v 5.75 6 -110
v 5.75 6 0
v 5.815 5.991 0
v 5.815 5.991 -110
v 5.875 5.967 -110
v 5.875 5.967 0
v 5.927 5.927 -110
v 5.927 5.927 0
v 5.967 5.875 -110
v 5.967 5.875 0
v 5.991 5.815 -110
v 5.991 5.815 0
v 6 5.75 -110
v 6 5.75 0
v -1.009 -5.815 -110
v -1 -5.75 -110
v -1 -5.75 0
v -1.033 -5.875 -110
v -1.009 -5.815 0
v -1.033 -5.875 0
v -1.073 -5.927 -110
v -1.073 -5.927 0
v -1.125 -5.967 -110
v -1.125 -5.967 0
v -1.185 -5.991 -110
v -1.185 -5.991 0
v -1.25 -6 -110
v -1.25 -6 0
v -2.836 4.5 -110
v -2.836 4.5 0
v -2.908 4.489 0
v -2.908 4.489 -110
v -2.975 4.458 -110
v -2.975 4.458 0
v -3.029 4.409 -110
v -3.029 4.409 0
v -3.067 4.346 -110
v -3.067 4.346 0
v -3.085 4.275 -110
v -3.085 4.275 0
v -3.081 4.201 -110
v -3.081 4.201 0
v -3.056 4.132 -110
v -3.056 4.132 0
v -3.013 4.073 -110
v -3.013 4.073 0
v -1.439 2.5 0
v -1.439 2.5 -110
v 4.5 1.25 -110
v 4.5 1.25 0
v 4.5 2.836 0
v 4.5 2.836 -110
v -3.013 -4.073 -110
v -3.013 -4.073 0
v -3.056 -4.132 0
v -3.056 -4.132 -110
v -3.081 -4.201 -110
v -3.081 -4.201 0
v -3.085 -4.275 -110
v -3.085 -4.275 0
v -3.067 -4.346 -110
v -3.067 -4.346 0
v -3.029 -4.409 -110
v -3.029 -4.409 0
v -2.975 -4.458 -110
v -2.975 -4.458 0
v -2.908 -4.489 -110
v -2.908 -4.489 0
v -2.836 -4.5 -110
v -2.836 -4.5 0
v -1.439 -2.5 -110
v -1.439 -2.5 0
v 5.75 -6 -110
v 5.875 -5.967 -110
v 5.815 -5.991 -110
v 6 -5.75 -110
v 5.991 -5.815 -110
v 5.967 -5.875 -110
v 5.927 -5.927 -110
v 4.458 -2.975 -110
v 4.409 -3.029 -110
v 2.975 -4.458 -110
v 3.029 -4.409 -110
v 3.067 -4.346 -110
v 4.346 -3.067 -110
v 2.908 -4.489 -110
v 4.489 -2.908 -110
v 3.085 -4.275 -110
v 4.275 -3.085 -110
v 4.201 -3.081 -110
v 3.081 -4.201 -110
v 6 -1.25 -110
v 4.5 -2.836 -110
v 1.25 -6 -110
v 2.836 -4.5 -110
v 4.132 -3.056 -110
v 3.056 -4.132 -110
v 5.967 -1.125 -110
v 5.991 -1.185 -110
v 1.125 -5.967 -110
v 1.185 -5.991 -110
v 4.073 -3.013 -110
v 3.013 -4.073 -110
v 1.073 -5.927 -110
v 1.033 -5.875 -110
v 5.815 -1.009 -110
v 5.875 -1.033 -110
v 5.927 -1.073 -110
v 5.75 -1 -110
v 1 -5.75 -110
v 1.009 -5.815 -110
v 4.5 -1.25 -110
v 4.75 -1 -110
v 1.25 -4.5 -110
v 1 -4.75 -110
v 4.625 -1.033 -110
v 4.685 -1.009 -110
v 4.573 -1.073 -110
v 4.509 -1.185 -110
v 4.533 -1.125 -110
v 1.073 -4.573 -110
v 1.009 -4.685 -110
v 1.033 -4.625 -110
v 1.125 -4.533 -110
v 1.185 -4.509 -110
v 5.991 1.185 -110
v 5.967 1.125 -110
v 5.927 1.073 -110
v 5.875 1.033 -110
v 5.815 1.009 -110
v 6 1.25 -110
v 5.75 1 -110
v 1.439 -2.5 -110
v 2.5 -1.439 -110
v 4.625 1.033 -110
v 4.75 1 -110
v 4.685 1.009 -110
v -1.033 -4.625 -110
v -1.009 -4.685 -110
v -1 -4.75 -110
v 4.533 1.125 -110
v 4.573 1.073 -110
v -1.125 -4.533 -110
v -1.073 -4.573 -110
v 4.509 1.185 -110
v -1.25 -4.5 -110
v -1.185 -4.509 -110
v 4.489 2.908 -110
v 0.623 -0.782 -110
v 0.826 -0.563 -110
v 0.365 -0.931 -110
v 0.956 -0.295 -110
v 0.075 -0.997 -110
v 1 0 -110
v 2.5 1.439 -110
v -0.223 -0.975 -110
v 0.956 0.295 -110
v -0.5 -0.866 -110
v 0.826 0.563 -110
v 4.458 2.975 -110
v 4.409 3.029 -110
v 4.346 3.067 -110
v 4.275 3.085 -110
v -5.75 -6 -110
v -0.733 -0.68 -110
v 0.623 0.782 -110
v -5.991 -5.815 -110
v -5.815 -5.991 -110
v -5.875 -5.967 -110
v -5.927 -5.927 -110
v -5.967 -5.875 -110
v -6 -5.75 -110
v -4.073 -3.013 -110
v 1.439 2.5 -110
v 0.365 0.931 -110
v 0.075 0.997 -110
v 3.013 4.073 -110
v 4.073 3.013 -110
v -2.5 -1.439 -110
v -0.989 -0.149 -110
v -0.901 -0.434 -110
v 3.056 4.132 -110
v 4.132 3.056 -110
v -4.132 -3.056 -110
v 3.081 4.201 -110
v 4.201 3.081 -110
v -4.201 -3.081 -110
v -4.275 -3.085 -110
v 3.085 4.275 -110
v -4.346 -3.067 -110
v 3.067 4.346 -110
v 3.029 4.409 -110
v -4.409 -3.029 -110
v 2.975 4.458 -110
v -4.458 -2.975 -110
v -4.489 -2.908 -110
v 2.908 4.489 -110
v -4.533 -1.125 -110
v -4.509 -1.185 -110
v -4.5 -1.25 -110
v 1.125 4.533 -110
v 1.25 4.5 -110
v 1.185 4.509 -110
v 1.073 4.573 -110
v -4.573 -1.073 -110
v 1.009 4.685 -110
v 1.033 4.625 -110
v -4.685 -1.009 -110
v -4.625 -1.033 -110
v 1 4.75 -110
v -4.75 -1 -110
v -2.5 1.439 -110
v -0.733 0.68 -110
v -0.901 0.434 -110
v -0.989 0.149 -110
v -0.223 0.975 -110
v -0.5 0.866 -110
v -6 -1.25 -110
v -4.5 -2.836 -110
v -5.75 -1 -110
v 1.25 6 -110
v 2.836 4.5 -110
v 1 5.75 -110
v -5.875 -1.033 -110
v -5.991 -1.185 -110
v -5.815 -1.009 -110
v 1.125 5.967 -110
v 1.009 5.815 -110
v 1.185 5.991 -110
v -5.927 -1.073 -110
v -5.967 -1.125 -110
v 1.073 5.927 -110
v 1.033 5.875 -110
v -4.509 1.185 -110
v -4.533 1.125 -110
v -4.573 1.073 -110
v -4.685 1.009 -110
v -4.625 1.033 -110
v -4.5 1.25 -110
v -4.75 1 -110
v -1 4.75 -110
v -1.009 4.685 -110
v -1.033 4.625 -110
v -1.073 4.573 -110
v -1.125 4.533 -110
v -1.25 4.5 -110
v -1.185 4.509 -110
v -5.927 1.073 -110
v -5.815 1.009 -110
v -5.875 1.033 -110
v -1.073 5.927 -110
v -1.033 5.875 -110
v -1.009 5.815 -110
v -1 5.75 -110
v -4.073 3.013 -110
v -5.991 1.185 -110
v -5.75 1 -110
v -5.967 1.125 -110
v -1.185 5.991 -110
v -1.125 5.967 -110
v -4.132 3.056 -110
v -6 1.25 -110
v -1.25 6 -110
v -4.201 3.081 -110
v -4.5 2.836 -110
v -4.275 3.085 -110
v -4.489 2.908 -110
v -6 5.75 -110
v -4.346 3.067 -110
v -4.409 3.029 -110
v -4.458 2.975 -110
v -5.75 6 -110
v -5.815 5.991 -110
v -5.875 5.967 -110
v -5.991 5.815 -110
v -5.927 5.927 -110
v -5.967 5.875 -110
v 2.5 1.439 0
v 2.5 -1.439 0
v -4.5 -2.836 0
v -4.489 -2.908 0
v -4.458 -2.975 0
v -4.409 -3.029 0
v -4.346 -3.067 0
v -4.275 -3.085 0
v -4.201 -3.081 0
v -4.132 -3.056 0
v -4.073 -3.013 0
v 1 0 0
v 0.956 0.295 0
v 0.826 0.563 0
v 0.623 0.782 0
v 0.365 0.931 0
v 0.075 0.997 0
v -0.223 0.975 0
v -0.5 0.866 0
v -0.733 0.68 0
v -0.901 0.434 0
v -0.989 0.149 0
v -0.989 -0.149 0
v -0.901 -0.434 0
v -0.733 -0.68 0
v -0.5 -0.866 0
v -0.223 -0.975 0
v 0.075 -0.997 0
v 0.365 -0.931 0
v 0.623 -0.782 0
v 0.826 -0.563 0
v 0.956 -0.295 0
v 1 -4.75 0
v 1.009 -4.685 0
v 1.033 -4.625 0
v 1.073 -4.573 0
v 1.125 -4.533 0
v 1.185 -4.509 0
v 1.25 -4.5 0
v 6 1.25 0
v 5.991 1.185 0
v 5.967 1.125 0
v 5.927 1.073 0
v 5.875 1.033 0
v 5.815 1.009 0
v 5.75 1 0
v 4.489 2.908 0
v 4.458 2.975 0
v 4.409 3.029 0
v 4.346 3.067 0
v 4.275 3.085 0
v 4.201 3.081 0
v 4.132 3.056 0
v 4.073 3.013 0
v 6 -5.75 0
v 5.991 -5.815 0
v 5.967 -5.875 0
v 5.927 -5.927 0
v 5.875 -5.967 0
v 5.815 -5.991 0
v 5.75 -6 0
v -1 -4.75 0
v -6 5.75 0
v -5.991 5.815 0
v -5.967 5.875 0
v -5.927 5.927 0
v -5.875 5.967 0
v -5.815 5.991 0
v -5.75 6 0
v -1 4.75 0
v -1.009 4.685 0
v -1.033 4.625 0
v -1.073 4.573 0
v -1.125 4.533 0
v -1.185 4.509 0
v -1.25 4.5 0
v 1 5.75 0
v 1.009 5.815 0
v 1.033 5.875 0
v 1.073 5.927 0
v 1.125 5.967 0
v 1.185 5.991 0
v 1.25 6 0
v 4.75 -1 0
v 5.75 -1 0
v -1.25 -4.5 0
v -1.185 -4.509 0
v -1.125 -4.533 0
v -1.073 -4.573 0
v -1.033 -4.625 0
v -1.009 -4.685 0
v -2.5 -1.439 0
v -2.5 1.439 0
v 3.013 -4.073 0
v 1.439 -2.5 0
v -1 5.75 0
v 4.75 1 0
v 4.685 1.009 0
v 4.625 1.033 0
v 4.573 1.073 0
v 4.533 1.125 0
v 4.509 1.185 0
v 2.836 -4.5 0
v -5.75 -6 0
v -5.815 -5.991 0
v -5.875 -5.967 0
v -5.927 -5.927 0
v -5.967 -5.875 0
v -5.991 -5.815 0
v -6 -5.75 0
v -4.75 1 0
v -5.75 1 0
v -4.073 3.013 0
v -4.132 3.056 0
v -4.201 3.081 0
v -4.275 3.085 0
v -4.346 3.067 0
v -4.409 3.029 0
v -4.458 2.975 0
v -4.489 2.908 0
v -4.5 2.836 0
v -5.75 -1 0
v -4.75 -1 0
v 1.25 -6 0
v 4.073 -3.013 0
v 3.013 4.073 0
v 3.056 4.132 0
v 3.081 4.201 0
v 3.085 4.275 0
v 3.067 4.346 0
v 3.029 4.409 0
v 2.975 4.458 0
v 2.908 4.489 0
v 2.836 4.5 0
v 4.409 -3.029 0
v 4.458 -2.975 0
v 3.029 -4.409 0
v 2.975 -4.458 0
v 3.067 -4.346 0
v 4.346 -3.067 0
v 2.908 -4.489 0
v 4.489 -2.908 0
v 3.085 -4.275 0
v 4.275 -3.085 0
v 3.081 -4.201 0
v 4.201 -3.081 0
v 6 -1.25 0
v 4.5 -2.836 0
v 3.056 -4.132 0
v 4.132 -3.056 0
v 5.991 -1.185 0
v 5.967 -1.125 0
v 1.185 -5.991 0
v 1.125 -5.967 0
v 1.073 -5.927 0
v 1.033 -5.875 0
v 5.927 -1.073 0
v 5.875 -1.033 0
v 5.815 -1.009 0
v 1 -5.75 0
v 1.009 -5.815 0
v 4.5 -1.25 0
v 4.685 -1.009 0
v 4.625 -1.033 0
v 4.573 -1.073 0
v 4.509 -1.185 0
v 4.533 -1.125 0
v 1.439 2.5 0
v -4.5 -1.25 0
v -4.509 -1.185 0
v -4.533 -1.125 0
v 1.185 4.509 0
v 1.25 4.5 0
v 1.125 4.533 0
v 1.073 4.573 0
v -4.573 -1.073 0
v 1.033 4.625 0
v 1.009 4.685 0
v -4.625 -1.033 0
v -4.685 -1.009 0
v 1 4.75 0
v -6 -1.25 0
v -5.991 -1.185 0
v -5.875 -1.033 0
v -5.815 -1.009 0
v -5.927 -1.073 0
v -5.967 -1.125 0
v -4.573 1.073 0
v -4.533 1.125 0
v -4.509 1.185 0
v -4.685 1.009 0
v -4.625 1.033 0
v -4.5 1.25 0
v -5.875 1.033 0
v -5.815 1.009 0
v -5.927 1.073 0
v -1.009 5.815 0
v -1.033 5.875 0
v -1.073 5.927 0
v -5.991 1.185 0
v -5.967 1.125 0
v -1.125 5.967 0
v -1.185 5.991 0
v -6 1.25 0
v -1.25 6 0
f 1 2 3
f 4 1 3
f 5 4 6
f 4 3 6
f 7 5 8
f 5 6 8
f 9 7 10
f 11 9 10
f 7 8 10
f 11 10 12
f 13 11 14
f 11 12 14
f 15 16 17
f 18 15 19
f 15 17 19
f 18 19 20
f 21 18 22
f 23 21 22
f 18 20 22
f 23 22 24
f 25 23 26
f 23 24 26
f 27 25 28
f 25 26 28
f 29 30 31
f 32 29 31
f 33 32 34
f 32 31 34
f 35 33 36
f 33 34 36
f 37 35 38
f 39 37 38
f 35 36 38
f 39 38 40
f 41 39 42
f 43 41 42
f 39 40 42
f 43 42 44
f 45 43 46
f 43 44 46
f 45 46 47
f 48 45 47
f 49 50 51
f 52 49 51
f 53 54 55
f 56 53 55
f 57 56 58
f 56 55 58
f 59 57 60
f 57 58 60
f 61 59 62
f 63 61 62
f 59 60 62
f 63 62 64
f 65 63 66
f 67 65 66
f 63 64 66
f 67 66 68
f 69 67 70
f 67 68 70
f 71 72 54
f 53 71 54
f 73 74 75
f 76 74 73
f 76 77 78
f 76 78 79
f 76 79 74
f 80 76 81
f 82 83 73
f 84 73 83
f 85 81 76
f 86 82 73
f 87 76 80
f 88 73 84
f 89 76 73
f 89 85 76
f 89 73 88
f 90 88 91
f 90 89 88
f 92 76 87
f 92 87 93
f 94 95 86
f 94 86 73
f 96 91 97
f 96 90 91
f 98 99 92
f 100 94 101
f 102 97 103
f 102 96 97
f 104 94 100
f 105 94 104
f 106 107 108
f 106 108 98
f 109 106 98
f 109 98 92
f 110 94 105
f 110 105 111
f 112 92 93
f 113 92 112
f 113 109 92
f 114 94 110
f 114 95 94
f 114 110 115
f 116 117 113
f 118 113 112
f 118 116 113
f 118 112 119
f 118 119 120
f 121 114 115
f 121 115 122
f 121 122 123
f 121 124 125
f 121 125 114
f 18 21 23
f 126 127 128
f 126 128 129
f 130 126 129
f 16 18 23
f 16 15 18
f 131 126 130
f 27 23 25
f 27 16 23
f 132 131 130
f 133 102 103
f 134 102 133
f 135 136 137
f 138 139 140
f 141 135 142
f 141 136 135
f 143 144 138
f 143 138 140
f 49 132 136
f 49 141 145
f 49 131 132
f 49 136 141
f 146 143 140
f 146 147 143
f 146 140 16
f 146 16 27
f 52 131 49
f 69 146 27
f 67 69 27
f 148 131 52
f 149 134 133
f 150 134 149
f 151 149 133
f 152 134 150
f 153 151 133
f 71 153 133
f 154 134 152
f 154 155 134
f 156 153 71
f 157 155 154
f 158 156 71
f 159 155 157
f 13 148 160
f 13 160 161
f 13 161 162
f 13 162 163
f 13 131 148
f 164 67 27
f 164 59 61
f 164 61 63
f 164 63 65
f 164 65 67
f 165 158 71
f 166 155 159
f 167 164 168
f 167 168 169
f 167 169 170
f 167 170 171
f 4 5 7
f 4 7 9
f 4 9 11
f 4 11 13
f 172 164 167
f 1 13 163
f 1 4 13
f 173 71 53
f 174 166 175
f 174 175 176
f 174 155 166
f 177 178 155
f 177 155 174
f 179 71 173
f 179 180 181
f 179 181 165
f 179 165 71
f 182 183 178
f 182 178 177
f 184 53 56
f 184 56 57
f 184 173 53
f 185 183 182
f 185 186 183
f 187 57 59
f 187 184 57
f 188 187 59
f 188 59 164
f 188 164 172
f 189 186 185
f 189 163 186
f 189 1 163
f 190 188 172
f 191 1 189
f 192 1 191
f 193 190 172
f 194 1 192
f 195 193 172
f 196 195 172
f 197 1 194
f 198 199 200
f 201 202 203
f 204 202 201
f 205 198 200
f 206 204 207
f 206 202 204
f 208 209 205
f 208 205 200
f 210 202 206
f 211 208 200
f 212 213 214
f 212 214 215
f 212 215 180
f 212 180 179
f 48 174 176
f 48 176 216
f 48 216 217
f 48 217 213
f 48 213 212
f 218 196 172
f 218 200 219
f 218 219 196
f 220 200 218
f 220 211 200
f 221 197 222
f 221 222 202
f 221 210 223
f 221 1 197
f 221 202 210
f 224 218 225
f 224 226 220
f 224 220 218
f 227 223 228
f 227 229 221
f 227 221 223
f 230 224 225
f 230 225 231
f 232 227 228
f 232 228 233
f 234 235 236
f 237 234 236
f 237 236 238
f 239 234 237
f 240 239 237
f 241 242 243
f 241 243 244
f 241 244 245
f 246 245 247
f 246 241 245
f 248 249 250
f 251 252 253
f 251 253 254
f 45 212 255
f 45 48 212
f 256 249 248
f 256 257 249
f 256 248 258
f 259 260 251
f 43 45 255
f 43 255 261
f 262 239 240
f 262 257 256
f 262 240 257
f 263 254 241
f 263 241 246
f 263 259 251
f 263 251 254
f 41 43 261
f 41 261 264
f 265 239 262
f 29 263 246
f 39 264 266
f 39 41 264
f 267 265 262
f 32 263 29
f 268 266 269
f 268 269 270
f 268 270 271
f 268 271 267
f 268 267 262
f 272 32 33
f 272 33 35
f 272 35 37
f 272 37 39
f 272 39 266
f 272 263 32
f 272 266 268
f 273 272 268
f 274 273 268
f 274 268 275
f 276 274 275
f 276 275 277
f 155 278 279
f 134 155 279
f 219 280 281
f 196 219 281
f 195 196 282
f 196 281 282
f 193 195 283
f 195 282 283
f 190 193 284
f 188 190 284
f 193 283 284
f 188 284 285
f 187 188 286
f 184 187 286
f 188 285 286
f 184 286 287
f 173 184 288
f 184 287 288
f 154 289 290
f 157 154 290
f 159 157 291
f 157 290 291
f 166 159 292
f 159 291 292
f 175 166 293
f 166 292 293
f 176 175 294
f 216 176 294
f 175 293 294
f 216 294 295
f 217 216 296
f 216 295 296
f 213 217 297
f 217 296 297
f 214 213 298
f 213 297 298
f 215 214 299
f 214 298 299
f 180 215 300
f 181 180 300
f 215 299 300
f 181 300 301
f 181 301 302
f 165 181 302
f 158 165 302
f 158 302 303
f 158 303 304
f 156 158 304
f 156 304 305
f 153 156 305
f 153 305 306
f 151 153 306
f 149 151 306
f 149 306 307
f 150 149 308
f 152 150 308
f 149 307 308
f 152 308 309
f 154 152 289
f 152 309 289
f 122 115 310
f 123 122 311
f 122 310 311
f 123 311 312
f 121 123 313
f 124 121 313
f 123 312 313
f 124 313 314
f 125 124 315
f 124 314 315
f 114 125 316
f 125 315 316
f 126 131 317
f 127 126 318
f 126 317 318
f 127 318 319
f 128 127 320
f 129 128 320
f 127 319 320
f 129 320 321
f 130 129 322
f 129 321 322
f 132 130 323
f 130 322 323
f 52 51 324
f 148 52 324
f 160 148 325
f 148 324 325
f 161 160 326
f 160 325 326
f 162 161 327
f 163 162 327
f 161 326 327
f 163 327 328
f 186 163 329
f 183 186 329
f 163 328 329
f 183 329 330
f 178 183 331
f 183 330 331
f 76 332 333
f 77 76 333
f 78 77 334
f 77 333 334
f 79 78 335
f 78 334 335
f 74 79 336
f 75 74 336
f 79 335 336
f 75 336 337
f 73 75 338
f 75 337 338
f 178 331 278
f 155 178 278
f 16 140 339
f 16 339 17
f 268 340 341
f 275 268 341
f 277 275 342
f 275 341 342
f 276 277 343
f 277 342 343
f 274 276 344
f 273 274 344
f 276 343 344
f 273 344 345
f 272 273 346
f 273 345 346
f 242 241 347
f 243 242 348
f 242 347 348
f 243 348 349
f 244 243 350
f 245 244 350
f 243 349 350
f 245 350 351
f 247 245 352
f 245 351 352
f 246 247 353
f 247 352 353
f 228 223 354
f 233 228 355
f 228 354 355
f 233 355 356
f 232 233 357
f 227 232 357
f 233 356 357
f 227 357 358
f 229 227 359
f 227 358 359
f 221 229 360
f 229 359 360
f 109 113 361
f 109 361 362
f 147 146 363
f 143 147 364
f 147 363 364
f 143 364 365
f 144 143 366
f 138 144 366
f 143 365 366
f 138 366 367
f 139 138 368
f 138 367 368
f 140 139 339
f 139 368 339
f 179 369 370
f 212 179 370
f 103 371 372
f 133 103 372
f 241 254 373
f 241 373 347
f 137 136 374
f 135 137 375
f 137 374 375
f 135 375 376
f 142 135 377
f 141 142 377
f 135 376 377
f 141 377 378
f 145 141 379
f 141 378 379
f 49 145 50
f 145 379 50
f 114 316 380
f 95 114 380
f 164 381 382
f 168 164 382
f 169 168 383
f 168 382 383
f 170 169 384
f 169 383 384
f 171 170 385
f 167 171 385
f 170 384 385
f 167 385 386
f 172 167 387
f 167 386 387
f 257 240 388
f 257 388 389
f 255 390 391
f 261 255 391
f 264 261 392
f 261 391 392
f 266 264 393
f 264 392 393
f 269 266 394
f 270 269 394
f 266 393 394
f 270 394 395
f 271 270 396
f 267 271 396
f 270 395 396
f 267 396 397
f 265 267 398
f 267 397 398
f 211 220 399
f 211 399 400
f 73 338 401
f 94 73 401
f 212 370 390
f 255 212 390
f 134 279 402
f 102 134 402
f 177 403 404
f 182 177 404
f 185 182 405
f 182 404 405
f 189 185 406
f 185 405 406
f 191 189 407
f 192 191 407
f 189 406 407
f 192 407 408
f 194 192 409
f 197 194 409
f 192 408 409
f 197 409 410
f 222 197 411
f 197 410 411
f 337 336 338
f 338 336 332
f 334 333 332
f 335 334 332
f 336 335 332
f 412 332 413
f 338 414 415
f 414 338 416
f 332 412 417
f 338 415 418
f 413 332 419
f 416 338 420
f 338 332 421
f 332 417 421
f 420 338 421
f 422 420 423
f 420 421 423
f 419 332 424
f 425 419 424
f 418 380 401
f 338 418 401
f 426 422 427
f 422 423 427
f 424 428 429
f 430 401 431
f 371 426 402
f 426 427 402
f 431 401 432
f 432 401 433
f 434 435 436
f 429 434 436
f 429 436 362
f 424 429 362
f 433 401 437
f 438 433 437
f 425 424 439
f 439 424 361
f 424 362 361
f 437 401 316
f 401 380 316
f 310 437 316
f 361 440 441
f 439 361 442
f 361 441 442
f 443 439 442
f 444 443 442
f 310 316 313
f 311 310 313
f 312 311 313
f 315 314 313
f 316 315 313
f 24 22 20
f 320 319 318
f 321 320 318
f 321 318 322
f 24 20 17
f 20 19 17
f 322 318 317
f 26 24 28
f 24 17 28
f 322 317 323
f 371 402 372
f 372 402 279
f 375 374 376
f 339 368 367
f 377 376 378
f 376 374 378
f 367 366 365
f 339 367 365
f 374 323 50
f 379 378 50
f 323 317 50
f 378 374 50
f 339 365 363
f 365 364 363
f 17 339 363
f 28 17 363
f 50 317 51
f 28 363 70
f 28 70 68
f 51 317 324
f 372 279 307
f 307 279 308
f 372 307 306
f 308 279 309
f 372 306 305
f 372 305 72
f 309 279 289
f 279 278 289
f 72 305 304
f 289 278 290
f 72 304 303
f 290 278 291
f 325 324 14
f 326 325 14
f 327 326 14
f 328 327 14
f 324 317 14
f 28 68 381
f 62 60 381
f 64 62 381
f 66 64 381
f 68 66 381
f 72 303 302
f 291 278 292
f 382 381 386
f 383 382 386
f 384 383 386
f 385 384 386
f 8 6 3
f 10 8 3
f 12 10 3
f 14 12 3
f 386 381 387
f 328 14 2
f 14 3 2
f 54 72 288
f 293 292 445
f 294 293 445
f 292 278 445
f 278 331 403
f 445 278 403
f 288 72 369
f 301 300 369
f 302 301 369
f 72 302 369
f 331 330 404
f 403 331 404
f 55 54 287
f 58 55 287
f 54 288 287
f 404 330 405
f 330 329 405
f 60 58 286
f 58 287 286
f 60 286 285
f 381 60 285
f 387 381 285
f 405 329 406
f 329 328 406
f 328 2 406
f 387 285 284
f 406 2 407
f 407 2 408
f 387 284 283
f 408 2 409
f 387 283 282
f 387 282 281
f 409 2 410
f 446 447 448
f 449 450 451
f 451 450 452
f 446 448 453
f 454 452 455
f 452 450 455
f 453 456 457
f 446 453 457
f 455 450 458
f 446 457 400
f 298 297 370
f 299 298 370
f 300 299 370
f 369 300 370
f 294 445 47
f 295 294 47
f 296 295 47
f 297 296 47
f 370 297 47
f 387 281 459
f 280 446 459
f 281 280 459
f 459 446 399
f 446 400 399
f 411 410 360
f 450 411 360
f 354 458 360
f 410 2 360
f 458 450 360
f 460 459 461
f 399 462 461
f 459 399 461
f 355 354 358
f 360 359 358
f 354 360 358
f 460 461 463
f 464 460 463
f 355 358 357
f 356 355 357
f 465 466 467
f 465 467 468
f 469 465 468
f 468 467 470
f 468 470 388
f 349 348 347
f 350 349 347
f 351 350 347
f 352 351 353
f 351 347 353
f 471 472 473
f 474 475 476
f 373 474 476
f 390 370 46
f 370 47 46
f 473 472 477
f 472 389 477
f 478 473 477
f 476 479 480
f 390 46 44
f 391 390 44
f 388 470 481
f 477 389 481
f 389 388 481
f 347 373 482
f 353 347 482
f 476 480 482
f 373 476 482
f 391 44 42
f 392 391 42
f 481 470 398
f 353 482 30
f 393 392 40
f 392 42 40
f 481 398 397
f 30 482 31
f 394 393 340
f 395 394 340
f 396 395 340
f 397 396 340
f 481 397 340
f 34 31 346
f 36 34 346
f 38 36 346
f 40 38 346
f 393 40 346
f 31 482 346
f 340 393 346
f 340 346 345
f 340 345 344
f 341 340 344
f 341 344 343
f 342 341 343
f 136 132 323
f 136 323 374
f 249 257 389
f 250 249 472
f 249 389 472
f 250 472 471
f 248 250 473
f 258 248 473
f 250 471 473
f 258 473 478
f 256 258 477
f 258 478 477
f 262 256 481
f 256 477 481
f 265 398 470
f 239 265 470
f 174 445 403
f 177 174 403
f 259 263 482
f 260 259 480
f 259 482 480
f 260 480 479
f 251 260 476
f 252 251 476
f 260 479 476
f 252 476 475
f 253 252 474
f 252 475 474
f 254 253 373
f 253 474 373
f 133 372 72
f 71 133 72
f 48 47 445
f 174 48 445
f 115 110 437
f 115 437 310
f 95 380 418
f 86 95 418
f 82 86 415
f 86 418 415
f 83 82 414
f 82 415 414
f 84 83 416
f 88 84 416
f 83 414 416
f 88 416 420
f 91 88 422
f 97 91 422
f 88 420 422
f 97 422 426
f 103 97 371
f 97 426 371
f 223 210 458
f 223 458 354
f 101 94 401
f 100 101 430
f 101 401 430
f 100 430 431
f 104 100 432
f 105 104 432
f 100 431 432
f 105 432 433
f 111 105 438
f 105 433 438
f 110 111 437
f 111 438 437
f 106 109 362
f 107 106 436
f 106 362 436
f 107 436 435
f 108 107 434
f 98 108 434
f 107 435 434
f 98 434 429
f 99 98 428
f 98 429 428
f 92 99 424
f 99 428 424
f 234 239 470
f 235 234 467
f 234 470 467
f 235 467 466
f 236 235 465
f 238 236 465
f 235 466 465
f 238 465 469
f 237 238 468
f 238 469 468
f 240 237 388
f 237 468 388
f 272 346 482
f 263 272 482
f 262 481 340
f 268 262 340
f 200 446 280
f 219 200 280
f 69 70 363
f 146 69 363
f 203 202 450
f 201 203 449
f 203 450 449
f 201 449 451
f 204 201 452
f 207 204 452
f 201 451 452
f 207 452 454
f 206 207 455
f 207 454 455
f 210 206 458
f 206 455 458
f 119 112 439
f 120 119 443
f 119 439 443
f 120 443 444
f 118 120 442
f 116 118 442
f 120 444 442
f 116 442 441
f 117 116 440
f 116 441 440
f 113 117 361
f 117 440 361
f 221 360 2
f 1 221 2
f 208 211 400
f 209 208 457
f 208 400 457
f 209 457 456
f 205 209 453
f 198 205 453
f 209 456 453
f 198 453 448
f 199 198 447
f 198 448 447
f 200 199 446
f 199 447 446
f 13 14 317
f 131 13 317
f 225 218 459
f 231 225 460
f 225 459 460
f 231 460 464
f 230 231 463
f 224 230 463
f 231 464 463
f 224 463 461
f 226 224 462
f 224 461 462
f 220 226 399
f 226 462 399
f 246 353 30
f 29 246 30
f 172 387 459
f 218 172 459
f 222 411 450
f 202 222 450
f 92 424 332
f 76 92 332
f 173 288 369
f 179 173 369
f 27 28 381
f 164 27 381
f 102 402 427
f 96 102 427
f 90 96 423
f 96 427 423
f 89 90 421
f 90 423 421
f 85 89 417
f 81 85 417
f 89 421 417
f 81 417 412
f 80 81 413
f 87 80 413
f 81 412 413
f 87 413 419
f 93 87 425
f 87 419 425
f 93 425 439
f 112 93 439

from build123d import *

# Parameters (mm, degrees)
SZKIC1_R                    = 1
DODANIE_WYCI_GNI_CIE1_DEPTH = 110


with BuildPart() as part:
    # Szkic1 → Dodanie-wyciągnięcie1 (new body)
    with BuildSketch(Plane.XY):
        with BuildLine():
            Line((-1.439339828, 2.5), (1.439339828, 2.5))
            Line((1.439339828, 2.5), (3.012563133, 4.073223305))
            ThreePointArc((3.012563133, 4.073223305), (3.066756321, 4.345670858), (2.835786438, 4.5))
            Line((2.835786438, 4.5), (1.25, 4.5))
            ThreePointArc((1.25, 4.5), (1.073223305, 4.573223305), (1, 4.75))
            Line((1, 4.75), (1, 5.75))
            ThreePointArc((1, 5.75), (1.073223305, 5.926776695), (1.25, 6))
            Line((1.25, 6), (5.75, 6))
            ThreePointArc((5.75, 6), (5.926776695, 5.926776695), (6, 5.75))
            Line((6, 5.75), (6, 1.25))
            ThreePointArc((6, 1.25), (5.926776695, 1.073223305), (5.75, 1))
            Line((5.75, 1), (4.75, 1))
            ThreePointArc((4.75, 1), (4.573223305, 1.073223305), (4.5, 1.25))
            Line((4.5, 1.25), (4.5, 2.835786438))
            ThreePointArc((4.5, 2.835786438), (4.345670858, 3.066756321), (4.073223305, 3.012563133))
            Line((4.073223305, 3.012563133), (2.5, 1.439339828))
            Line((2.5, 1.439339828), (2.5, -1.439339828))
            Line((2.5, -1.439339828), (4.073223305, -3.012563133))
            ThreePointArc((4.073223305, -3.012563133), (4.345670858, -3.066756321), (4.5, -2.835786438))
            Line((4.5, -2.835786438), (4.5, -1.25))
            ThreePointArc((4.5, -1.25), (4.573223305, -1.073223305), (4.75, -1))
            Line((4.75, -1), (5.75, -1))
            ThreePointArc((5.75, -1), (5.926776695, -1.073223305), (6, -1.25))
            Line((6, -1.25), (6, -5.75))
            ThreePointArc((6, -5.75), (5.926776695, -5.926776695), (5.75, -6))
            Line((5.75, -6), (1.25, -6))
            ThreePointArc((1.25, -6), (1.073223305, -5.926776695), (1, -5.75))
            Line((1, -5.75), (1, -4.75))
            ThreePointArc((1, -4.75), (1.073223305, -4.573223305), (1.25, -4.5))
            Line((1.25, -4.5), (2.835786438, -4.5))
            ThreePointArc((2.835786438, -4.5), (3.066756321, -4.345670858), (3.012563133, -4.073223305))
            Line((3.012563133, -4.073223305), (1.439339828, -2.5))
            Line((1.439339828, -2.5), (-1.439339828, -2.5))
            Line((-1.439339828, -2.5), (-3.012563133, -4.073223305))
            ThreePointArc((-3.012563133, -4.073223305), (-3.066756321, -4.345670858), (-2.835786438, -4.5))
            Line((-2.835786438, -4.5), (-1.25, -4.5))
            ThreePointArc((-1.25, -4.5), (-1.073223305, -4.573223305), (-1, -4.75))
            Line((-1, -4.75), (-1, -5.75))
            ThreePointArc((-1, -5.75), (-1.073223305, -5.926776695), (-1.25, -6))
            Line((-1.25, -6), (-5.75, -6))
            ThreePointArc((-5.75, -6), (-5.926776695, -5.926776695), (-6, -5.75))
            Line((-6, -5.75), (-6, -1.25))
            ThreePointArc((-6, -1.25), (-5.926776695, -1.073223305), (-5.75, -1))
            Line((-5.75, -1), (-4.75, -1))
            ThreePointArc((-4.75, -1), (-4.573223305, -1.073223305), (-4.5, -1.25))
            Line((-4.5, -1.25), (-4.5, -2.835786438))
            ThreePointArc((-4.5, -2.835786438), (-4.345670858, -3.066756321), (-4.073223305, -3.012563133))
            Line((-4.073223305, -3.012563133), (-2.5, -1.439339828))
            Line((-2.5, -1.439339828), (-2.5, 1.439339828))
            Line((-2.5, 1.439339828), (-4.073223305, 3.012563133))
            ThreePointArc((-4.073223305, 3.012563133), (-4.345670858, 3.066756321), (-4.5, 2.835786438))
            Line((-4.5, 2.835786438), (-4.5, 1.25))
            ThreePointArc((-4.5, 1.25), (-4.573223305, 1.073223305), (-4.75, 1))
            Line((-4.75, 1), (-5.75, 1))
            ThreePointArc((-5.75, 1), (-5.926776695, 1.073223305), (-6, 1.25))
            Line((-6, 1.25), (-6, 5.75))
            ThreePointArc((-6, 5.75), (-5.926776695, 5.926776695), (-5.75, 6))
            Line((-5.75, 6), (-1.25, 6))
            ThreePointArc((-1.25, 6), (-1.073223305, 5.926776695), (-1, 5.75))
            Line((-1, 5.75), (-1, 4.75))
            ThreePointArc((-1, 4.75), (-1.073223305, 4.573223305), (-1.25, 4.5))
            Line((-1.25, 4.5), (-2.835786438, 4.5))
            ThreePointArc((-2.835786438, 4.5), (-3.066756321, 4.345670858), (-3.012563133, 4.073223305))
            Line((-3.012563133, 4.073223305), (-1.439339828, 2.5))
        make_face()
        Circle(SZKIC1_R, mode=Mode.SUBTRACT)
    extrude(amount=-DODANIE_WYCI_GNI_CIE1_DEPTH)


solid = part.part
